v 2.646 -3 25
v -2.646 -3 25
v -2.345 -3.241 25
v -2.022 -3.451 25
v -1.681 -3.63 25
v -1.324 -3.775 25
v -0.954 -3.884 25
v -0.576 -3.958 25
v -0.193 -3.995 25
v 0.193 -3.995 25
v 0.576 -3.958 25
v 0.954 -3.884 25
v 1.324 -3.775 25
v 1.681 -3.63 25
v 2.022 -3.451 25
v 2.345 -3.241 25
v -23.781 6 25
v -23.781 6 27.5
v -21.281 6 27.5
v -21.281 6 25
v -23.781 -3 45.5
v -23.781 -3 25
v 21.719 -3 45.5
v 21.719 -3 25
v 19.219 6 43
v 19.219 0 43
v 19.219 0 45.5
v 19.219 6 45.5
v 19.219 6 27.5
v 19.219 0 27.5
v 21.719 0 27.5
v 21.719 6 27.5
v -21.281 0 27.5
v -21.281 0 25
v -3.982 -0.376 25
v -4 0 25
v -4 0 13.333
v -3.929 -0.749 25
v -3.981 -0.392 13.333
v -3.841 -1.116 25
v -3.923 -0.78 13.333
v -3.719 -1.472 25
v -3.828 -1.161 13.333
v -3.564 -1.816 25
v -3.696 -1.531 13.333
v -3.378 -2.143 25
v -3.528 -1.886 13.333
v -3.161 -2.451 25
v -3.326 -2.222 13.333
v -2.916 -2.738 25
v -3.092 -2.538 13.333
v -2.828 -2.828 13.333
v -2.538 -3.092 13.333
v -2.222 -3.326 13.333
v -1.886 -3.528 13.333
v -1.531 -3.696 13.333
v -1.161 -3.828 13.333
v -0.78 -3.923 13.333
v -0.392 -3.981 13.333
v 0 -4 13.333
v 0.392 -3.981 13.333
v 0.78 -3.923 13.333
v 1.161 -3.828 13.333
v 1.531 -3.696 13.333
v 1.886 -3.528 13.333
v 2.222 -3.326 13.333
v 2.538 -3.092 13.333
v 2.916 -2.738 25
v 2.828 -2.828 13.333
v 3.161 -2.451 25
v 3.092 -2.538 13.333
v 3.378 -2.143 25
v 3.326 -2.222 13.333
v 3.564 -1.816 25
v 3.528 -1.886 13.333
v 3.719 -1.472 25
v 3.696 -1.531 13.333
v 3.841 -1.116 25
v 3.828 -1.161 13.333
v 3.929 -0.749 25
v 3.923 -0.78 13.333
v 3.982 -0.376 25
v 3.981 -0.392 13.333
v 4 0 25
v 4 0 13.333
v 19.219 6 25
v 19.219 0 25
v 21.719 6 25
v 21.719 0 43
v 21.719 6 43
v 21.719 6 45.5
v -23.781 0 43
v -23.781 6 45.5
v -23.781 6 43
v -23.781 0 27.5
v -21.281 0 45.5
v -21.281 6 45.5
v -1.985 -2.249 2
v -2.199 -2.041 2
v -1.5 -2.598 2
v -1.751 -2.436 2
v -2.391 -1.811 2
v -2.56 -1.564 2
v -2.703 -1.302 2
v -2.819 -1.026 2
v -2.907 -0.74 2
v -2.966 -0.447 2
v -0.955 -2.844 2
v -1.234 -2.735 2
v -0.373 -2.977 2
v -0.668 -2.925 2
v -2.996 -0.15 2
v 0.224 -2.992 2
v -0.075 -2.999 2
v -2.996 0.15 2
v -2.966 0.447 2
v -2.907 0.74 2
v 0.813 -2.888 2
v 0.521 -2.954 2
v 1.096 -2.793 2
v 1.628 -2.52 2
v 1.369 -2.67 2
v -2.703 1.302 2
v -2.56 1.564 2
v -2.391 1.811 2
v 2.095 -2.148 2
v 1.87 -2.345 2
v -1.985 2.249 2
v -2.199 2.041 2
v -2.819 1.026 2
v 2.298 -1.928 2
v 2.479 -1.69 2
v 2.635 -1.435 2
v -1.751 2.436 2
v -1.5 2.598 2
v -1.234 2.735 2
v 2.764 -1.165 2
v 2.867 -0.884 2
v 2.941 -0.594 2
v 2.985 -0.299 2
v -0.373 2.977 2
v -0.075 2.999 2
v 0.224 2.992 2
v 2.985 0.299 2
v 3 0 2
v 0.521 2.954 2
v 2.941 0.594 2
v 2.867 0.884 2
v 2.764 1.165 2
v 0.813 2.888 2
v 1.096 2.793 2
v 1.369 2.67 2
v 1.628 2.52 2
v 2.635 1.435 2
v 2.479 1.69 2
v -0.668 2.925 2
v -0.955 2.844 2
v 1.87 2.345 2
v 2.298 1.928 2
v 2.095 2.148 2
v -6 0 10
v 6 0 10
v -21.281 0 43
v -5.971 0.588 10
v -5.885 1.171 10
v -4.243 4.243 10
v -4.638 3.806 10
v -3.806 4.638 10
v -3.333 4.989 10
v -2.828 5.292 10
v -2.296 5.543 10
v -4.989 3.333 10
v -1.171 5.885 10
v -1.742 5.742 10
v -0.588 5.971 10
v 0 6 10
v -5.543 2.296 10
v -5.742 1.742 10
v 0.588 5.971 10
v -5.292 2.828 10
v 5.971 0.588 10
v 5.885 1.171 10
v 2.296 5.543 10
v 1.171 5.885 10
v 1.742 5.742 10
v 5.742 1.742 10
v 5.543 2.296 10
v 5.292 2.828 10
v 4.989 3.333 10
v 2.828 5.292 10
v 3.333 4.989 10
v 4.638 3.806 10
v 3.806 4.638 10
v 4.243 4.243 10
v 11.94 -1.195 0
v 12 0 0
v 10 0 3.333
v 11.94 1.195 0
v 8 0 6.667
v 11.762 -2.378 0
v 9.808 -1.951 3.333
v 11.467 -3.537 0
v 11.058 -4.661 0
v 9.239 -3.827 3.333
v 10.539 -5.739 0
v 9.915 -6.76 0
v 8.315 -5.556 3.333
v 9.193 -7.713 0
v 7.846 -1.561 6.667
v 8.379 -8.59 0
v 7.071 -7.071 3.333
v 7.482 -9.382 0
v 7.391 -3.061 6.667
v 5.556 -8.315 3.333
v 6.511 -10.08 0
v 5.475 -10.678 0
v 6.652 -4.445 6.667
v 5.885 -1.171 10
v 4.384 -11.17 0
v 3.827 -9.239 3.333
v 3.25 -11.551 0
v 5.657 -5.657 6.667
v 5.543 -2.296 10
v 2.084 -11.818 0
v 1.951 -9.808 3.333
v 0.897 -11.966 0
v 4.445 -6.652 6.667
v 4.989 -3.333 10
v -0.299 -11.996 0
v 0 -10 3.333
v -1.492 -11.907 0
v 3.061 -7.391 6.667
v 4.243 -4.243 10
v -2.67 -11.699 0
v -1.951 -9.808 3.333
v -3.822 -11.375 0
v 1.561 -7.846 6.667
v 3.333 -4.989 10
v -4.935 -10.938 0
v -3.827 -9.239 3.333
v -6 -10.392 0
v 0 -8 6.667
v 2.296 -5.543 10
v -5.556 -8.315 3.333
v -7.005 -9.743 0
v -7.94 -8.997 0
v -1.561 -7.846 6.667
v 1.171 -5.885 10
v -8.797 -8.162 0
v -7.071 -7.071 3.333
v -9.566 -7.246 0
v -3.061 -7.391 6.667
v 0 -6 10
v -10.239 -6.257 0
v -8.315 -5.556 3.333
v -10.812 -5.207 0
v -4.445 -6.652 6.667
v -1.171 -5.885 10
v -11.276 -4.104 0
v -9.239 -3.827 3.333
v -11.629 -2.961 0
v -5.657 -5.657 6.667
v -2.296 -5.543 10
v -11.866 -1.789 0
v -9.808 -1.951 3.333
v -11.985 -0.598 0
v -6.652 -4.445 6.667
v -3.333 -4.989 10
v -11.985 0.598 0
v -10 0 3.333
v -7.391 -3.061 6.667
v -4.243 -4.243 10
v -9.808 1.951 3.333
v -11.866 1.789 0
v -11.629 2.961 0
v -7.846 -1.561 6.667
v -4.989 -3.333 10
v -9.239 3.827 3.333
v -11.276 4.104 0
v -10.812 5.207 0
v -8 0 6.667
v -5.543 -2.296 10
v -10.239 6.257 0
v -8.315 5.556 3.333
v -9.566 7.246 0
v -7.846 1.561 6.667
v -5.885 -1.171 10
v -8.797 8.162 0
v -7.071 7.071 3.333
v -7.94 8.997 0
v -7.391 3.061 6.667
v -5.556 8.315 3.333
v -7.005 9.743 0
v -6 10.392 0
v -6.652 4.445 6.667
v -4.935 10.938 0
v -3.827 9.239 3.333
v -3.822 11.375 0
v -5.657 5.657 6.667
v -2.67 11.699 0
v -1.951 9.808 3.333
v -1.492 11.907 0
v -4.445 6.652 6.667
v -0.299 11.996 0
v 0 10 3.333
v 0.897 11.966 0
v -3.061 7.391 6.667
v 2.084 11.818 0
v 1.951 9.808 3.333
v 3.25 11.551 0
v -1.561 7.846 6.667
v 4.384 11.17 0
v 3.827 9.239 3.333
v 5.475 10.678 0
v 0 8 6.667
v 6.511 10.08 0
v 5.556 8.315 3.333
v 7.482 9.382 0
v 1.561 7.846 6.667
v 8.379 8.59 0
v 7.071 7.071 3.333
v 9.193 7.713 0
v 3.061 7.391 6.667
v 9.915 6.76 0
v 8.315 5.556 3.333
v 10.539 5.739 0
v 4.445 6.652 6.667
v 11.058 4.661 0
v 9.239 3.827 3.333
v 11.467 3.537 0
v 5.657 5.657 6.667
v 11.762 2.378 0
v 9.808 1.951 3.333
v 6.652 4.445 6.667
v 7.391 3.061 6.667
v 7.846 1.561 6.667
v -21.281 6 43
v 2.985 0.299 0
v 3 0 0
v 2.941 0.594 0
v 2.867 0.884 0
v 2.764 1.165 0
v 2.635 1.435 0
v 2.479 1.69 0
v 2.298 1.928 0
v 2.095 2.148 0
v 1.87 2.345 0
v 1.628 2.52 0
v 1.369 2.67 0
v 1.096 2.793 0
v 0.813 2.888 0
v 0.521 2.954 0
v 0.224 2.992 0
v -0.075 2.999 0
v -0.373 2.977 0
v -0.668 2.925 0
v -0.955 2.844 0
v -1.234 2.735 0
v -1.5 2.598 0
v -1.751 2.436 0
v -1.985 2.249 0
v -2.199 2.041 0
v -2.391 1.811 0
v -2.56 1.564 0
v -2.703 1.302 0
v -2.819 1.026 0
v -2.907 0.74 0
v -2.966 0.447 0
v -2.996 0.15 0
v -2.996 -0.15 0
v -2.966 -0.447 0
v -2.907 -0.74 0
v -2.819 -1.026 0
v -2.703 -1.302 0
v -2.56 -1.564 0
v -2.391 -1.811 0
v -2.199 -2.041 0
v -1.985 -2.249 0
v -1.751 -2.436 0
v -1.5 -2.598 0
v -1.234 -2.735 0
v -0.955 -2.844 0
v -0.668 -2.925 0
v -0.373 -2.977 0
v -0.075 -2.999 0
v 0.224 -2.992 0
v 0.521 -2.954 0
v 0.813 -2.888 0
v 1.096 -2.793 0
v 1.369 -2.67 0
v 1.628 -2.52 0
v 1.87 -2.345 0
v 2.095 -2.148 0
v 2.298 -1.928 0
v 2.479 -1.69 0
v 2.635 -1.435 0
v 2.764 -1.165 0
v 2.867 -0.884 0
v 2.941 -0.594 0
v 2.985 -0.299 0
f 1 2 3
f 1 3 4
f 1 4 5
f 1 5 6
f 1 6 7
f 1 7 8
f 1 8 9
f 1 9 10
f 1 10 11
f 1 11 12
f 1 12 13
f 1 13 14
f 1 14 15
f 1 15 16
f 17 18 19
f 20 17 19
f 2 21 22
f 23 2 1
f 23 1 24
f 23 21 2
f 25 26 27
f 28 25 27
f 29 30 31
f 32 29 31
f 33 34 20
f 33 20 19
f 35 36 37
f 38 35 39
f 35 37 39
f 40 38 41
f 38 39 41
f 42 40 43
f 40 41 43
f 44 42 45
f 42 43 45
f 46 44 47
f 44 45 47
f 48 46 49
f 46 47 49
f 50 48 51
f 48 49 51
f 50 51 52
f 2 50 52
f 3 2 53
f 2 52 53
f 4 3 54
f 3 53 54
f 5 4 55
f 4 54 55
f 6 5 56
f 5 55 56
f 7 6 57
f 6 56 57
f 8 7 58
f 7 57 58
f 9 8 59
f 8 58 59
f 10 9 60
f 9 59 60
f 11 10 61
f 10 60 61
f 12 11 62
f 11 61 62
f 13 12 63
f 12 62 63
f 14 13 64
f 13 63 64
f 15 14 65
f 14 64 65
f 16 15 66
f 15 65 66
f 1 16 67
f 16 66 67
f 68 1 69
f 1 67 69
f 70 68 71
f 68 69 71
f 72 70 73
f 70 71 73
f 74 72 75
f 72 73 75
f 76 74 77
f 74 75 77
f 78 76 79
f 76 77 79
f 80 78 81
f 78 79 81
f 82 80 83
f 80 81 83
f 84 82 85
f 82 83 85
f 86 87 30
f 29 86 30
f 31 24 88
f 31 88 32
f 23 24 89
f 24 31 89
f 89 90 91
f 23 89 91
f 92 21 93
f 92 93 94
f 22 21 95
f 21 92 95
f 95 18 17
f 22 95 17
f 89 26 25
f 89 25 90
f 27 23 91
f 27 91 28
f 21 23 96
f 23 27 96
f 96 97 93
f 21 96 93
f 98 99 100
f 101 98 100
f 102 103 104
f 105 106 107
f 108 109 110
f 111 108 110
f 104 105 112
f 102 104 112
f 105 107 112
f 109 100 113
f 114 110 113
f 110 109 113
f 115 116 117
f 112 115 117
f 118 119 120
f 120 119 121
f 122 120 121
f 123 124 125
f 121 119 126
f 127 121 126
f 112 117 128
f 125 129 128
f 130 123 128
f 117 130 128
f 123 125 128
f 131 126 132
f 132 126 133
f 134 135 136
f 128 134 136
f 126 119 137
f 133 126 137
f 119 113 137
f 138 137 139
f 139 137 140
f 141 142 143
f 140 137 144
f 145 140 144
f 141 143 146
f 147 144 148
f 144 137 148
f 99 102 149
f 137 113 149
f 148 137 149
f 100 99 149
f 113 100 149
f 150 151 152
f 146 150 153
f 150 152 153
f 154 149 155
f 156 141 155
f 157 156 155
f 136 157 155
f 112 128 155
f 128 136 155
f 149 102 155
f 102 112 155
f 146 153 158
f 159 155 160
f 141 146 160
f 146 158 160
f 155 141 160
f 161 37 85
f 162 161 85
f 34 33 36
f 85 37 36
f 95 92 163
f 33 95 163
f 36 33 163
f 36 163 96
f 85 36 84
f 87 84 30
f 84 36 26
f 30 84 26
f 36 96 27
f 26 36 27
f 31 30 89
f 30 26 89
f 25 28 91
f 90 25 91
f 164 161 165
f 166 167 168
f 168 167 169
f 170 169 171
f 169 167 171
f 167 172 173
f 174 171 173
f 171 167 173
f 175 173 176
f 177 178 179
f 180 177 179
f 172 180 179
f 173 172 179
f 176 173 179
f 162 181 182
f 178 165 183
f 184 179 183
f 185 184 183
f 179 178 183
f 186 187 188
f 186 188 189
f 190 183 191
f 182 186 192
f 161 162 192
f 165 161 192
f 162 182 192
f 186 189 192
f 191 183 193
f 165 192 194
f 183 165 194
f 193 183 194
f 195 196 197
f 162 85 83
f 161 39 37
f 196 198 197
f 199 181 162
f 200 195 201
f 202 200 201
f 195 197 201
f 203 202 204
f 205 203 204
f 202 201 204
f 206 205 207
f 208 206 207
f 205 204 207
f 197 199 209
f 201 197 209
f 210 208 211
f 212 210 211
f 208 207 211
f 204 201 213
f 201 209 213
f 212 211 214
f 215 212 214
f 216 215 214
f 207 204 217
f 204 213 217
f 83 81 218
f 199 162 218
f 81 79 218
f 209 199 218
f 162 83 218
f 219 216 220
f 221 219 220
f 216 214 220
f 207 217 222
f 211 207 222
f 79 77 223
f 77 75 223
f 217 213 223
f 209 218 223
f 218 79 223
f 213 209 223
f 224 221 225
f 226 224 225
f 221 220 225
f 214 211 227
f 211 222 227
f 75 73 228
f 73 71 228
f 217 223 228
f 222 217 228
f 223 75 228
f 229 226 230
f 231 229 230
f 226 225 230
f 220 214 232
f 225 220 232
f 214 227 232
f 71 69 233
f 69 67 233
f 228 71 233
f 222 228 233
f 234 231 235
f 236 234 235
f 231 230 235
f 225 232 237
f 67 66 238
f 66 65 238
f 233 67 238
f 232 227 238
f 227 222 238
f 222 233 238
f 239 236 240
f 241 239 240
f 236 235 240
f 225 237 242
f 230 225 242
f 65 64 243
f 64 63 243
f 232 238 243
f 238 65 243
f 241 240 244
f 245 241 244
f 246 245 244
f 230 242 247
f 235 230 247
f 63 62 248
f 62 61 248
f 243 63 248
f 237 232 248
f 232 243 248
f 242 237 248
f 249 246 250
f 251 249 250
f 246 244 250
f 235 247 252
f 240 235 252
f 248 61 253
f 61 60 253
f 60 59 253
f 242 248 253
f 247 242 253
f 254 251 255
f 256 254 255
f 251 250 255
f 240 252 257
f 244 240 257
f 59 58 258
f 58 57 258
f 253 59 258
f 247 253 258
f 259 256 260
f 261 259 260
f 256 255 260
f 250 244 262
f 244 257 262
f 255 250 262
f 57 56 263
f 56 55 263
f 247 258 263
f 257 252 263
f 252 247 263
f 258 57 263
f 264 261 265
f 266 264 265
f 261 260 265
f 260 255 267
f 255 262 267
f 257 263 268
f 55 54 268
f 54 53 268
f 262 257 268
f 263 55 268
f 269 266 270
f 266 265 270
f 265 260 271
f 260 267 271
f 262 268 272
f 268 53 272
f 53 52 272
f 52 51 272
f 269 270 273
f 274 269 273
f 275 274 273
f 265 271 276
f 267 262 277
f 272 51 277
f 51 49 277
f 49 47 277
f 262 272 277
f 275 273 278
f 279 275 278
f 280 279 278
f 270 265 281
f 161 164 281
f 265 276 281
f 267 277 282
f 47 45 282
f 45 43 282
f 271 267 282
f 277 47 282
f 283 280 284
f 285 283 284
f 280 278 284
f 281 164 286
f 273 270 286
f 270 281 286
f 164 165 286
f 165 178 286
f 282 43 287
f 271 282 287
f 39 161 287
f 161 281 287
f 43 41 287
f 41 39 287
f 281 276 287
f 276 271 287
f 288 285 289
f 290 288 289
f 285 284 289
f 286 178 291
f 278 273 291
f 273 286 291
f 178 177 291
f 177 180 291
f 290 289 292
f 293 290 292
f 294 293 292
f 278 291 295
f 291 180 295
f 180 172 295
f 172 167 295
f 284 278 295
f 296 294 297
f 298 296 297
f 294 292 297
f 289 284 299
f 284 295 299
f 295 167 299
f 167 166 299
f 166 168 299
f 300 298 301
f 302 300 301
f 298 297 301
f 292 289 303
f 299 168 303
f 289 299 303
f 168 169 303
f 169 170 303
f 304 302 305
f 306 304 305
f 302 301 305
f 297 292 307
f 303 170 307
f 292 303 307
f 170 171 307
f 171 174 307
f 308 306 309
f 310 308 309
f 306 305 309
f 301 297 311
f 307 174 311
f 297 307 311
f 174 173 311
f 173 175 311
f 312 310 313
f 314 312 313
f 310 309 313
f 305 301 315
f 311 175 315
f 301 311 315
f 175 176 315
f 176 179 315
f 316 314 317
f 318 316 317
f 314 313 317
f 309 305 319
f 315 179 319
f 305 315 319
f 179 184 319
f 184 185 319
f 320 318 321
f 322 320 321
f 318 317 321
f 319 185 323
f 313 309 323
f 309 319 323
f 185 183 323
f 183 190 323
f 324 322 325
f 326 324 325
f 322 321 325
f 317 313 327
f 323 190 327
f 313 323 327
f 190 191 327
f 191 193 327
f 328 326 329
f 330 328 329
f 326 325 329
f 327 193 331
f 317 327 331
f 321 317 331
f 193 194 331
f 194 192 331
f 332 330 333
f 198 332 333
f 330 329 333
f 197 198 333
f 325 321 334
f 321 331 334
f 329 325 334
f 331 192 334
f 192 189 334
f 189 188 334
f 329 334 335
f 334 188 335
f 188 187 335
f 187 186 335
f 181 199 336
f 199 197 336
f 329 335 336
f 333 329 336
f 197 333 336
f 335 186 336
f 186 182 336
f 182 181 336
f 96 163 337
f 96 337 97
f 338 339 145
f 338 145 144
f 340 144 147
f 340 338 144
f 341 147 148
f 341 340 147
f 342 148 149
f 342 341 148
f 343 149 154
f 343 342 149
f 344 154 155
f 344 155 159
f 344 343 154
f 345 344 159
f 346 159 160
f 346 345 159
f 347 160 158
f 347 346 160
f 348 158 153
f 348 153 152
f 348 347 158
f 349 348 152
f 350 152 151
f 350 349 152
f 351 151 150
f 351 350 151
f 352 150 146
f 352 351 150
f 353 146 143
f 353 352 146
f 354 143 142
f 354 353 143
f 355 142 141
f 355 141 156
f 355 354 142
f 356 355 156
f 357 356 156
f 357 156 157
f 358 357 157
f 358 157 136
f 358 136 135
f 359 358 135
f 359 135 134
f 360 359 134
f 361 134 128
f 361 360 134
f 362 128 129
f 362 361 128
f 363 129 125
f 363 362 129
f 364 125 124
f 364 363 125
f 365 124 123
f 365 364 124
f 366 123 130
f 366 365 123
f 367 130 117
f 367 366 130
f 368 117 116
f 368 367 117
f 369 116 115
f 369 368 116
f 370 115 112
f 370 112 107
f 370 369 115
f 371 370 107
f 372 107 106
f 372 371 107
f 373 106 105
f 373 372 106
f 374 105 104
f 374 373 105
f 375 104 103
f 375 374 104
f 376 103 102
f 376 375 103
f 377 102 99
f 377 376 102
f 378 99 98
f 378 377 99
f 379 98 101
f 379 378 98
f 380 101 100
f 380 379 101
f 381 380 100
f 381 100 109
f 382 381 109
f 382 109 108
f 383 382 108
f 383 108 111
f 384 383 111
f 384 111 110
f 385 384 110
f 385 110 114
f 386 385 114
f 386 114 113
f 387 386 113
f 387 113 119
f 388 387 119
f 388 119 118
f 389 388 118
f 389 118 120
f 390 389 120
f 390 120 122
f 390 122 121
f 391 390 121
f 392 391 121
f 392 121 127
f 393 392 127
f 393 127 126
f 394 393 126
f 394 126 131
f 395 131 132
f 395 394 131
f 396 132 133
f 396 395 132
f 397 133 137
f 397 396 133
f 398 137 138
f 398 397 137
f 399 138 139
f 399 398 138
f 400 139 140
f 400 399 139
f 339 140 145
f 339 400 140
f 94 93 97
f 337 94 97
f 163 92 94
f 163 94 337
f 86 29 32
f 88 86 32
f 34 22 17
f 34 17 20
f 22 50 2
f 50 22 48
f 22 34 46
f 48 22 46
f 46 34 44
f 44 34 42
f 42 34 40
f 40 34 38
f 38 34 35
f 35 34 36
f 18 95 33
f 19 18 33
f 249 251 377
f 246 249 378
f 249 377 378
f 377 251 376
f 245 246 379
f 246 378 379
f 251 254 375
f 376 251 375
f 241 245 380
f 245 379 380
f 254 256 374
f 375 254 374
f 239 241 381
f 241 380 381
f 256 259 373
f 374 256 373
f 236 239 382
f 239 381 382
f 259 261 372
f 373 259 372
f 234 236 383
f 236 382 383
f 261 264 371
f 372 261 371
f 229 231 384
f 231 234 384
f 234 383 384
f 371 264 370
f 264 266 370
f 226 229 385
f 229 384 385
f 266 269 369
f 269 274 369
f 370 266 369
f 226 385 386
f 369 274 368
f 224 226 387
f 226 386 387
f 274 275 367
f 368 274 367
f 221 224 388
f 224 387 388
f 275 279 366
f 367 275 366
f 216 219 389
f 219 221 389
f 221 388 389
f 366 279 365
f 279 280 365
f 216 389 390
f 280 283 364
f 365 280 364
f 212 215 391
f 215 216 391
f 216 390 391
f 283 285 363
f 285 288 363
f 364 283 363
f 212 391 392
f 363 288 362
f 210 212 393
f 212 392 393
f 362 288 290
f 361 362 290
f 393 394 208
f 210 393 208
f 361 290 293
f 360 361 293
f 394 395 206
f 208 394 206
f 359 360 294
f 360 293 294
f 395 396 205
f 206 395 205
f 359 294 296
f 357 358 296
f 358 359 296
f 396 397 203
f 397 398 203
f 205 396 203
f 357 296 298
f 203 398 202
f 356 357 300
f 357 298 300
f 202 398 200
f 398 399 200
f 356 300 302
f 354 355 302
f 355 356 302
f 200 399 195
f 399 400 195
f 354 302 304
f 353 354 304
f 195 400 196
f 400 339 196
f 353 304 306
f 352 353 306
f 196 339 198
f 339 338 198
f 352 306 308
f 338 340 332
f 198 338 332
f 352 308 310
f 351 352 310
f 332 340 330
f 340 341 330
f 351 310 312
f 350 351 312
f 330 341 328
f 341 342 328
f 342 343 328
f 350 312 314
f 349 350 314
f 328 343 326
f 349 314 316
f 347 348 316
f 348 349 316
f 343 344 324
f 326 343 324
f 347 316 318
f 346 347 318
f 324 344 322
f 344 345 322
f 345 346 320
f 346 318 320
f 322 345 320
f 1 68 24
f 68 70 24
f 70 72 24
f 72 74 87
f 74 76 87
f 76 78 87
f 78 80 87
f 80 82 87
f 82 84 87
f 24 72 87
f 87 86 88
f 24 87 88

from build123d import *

# Parameters (mm, degrees)
F2_R      = 4
F3_DEPTH  = 25
F4_W      = 2.5
F4_H      = 2.5
F5_DEPTH  = 6
F6_DEPTH  = 3
F7_W      = 7.8000803478
F7_H      = 15
F8_DEPTH  = 23.7818172899
F9_DEPTH  = 25
F10_R     = 3
F11_DEPTH = 2


with BuildPart() as f1:
    # F0 (on Front) → F1 (revolve)
    with BuildSketch(Plane.XZ):
        Polygon((0, 20), (0, 0), (12, 0), align=None)
    revolve(axis=Axis((0, 0, 10), (0, 0, -1)))

    # F2 (on Top) → F3 (join)
    with BuildSketch(Plane.XY):
        Circle(F2_R)
    extrude(amount=F3_DEPTH)



with BuildPart() as f5:
    # F4 (on Front) → F5 (new body)
    with BuildSketch(Plane.XZ):
        with Locations((20.4691827101, 44.25)):
            Rectangle(F4_W, F4_H)
    extrude(amount=-F5_DEPTH)


with BuildPart() as f5b:
    # F4 (on Front) → F5, piece 2 (new body)
    with BuildSketch(Plane.XZ):
        with Locations((-22.5308172899, 26.25)):
            Rectangle(F4_W, F4_H)
    extrude(amount=-F5_DEPTH)


with BuildPart() as f5c:
    # F4 (on Front) → F5, piece 3 (new body)
    with BuildSketch(Plane.XZ):
        with Locations((-22.5308172899, 44.25)):
            Rectangle(F4_W, F4_H)
    extrude(amount=-F5_DEPTH)


with BuildPart() as f5d:
    # F4 (on Front) → F5, piece 4 (new body)
    with BuildSketch(Plane.XZ):
        with Locations((20.4691827101, 26.25)):
            Rectangle(F4_W, F4_H)
    extrude(amount=-F5_DEPTH)


with BuildPart() as f1_1:
    add(f1.part)

    add(f5.part)  # F6 merges F5

    add(f5b.part)  # F6 merges F5b

    add(f5c.part)  # F6 merges F5c

    add(f5d.part)  # F6 merges F5d
    # F4 (on Front) → F6 (join)
    with BuildSketch(Plane.XZ):
        with Locations((-22.5308172899, 44.25)):
            Rectangle(F4_W, F4_H)
        Polygon((19.2191827101, 45.5), (-21.2808172899, 45.5), (-21.2808172899, 43), (-23.7808172899, 43), (-23.7808172899, 27.5), (-21.2808172899, 27.5), (-21.2808172899, 25), (19.2191827101, 25), (19.2191827101, 27.5), (21.7191827101, 27.5), (21.7191827101, 43), (19.2191827101, 43), align=None)
        with Locations((20.4691827101, 44.25)):
            Rectangle(F4_W, F4_H)
        with Locations((-22.5308172899, 26.25)):
            Rectangle(F4_W, F4_H)
        with Locations((20.4691827101, 26.25)):
            Rectangle(F4_W, F4_H)
    extrude(amount=F6_DEPTH)

    # F7 (on Right) → F8 (cut, through all)
    with BuildSketch(Plane.YZ):
        with Locations((3.9000401739, 17.5)):
            Rectangle(F7_W, F7_H)
    extrude(amount=-F8_DEPTH, mode=Mode.SUBTRACT)

    # F7 (on Right) → F9 (cut)
    with BuildSketch(Plane.YZ):
        with Locations((3.9000401739, 17.5)):
            Rectangle(F7_W, F7_H)
    extrude(amount=F9_DEPTH, mode=Mode.SUBTRACT)

    # F10 (on Top) → F11 (cut)
    with BuildSketch(Plane.XY):
        Circle(F10_R)
    extrude(amount=F11_DEPTH, mode=Mode.SUBTRACT)


solid = f1_1.part
